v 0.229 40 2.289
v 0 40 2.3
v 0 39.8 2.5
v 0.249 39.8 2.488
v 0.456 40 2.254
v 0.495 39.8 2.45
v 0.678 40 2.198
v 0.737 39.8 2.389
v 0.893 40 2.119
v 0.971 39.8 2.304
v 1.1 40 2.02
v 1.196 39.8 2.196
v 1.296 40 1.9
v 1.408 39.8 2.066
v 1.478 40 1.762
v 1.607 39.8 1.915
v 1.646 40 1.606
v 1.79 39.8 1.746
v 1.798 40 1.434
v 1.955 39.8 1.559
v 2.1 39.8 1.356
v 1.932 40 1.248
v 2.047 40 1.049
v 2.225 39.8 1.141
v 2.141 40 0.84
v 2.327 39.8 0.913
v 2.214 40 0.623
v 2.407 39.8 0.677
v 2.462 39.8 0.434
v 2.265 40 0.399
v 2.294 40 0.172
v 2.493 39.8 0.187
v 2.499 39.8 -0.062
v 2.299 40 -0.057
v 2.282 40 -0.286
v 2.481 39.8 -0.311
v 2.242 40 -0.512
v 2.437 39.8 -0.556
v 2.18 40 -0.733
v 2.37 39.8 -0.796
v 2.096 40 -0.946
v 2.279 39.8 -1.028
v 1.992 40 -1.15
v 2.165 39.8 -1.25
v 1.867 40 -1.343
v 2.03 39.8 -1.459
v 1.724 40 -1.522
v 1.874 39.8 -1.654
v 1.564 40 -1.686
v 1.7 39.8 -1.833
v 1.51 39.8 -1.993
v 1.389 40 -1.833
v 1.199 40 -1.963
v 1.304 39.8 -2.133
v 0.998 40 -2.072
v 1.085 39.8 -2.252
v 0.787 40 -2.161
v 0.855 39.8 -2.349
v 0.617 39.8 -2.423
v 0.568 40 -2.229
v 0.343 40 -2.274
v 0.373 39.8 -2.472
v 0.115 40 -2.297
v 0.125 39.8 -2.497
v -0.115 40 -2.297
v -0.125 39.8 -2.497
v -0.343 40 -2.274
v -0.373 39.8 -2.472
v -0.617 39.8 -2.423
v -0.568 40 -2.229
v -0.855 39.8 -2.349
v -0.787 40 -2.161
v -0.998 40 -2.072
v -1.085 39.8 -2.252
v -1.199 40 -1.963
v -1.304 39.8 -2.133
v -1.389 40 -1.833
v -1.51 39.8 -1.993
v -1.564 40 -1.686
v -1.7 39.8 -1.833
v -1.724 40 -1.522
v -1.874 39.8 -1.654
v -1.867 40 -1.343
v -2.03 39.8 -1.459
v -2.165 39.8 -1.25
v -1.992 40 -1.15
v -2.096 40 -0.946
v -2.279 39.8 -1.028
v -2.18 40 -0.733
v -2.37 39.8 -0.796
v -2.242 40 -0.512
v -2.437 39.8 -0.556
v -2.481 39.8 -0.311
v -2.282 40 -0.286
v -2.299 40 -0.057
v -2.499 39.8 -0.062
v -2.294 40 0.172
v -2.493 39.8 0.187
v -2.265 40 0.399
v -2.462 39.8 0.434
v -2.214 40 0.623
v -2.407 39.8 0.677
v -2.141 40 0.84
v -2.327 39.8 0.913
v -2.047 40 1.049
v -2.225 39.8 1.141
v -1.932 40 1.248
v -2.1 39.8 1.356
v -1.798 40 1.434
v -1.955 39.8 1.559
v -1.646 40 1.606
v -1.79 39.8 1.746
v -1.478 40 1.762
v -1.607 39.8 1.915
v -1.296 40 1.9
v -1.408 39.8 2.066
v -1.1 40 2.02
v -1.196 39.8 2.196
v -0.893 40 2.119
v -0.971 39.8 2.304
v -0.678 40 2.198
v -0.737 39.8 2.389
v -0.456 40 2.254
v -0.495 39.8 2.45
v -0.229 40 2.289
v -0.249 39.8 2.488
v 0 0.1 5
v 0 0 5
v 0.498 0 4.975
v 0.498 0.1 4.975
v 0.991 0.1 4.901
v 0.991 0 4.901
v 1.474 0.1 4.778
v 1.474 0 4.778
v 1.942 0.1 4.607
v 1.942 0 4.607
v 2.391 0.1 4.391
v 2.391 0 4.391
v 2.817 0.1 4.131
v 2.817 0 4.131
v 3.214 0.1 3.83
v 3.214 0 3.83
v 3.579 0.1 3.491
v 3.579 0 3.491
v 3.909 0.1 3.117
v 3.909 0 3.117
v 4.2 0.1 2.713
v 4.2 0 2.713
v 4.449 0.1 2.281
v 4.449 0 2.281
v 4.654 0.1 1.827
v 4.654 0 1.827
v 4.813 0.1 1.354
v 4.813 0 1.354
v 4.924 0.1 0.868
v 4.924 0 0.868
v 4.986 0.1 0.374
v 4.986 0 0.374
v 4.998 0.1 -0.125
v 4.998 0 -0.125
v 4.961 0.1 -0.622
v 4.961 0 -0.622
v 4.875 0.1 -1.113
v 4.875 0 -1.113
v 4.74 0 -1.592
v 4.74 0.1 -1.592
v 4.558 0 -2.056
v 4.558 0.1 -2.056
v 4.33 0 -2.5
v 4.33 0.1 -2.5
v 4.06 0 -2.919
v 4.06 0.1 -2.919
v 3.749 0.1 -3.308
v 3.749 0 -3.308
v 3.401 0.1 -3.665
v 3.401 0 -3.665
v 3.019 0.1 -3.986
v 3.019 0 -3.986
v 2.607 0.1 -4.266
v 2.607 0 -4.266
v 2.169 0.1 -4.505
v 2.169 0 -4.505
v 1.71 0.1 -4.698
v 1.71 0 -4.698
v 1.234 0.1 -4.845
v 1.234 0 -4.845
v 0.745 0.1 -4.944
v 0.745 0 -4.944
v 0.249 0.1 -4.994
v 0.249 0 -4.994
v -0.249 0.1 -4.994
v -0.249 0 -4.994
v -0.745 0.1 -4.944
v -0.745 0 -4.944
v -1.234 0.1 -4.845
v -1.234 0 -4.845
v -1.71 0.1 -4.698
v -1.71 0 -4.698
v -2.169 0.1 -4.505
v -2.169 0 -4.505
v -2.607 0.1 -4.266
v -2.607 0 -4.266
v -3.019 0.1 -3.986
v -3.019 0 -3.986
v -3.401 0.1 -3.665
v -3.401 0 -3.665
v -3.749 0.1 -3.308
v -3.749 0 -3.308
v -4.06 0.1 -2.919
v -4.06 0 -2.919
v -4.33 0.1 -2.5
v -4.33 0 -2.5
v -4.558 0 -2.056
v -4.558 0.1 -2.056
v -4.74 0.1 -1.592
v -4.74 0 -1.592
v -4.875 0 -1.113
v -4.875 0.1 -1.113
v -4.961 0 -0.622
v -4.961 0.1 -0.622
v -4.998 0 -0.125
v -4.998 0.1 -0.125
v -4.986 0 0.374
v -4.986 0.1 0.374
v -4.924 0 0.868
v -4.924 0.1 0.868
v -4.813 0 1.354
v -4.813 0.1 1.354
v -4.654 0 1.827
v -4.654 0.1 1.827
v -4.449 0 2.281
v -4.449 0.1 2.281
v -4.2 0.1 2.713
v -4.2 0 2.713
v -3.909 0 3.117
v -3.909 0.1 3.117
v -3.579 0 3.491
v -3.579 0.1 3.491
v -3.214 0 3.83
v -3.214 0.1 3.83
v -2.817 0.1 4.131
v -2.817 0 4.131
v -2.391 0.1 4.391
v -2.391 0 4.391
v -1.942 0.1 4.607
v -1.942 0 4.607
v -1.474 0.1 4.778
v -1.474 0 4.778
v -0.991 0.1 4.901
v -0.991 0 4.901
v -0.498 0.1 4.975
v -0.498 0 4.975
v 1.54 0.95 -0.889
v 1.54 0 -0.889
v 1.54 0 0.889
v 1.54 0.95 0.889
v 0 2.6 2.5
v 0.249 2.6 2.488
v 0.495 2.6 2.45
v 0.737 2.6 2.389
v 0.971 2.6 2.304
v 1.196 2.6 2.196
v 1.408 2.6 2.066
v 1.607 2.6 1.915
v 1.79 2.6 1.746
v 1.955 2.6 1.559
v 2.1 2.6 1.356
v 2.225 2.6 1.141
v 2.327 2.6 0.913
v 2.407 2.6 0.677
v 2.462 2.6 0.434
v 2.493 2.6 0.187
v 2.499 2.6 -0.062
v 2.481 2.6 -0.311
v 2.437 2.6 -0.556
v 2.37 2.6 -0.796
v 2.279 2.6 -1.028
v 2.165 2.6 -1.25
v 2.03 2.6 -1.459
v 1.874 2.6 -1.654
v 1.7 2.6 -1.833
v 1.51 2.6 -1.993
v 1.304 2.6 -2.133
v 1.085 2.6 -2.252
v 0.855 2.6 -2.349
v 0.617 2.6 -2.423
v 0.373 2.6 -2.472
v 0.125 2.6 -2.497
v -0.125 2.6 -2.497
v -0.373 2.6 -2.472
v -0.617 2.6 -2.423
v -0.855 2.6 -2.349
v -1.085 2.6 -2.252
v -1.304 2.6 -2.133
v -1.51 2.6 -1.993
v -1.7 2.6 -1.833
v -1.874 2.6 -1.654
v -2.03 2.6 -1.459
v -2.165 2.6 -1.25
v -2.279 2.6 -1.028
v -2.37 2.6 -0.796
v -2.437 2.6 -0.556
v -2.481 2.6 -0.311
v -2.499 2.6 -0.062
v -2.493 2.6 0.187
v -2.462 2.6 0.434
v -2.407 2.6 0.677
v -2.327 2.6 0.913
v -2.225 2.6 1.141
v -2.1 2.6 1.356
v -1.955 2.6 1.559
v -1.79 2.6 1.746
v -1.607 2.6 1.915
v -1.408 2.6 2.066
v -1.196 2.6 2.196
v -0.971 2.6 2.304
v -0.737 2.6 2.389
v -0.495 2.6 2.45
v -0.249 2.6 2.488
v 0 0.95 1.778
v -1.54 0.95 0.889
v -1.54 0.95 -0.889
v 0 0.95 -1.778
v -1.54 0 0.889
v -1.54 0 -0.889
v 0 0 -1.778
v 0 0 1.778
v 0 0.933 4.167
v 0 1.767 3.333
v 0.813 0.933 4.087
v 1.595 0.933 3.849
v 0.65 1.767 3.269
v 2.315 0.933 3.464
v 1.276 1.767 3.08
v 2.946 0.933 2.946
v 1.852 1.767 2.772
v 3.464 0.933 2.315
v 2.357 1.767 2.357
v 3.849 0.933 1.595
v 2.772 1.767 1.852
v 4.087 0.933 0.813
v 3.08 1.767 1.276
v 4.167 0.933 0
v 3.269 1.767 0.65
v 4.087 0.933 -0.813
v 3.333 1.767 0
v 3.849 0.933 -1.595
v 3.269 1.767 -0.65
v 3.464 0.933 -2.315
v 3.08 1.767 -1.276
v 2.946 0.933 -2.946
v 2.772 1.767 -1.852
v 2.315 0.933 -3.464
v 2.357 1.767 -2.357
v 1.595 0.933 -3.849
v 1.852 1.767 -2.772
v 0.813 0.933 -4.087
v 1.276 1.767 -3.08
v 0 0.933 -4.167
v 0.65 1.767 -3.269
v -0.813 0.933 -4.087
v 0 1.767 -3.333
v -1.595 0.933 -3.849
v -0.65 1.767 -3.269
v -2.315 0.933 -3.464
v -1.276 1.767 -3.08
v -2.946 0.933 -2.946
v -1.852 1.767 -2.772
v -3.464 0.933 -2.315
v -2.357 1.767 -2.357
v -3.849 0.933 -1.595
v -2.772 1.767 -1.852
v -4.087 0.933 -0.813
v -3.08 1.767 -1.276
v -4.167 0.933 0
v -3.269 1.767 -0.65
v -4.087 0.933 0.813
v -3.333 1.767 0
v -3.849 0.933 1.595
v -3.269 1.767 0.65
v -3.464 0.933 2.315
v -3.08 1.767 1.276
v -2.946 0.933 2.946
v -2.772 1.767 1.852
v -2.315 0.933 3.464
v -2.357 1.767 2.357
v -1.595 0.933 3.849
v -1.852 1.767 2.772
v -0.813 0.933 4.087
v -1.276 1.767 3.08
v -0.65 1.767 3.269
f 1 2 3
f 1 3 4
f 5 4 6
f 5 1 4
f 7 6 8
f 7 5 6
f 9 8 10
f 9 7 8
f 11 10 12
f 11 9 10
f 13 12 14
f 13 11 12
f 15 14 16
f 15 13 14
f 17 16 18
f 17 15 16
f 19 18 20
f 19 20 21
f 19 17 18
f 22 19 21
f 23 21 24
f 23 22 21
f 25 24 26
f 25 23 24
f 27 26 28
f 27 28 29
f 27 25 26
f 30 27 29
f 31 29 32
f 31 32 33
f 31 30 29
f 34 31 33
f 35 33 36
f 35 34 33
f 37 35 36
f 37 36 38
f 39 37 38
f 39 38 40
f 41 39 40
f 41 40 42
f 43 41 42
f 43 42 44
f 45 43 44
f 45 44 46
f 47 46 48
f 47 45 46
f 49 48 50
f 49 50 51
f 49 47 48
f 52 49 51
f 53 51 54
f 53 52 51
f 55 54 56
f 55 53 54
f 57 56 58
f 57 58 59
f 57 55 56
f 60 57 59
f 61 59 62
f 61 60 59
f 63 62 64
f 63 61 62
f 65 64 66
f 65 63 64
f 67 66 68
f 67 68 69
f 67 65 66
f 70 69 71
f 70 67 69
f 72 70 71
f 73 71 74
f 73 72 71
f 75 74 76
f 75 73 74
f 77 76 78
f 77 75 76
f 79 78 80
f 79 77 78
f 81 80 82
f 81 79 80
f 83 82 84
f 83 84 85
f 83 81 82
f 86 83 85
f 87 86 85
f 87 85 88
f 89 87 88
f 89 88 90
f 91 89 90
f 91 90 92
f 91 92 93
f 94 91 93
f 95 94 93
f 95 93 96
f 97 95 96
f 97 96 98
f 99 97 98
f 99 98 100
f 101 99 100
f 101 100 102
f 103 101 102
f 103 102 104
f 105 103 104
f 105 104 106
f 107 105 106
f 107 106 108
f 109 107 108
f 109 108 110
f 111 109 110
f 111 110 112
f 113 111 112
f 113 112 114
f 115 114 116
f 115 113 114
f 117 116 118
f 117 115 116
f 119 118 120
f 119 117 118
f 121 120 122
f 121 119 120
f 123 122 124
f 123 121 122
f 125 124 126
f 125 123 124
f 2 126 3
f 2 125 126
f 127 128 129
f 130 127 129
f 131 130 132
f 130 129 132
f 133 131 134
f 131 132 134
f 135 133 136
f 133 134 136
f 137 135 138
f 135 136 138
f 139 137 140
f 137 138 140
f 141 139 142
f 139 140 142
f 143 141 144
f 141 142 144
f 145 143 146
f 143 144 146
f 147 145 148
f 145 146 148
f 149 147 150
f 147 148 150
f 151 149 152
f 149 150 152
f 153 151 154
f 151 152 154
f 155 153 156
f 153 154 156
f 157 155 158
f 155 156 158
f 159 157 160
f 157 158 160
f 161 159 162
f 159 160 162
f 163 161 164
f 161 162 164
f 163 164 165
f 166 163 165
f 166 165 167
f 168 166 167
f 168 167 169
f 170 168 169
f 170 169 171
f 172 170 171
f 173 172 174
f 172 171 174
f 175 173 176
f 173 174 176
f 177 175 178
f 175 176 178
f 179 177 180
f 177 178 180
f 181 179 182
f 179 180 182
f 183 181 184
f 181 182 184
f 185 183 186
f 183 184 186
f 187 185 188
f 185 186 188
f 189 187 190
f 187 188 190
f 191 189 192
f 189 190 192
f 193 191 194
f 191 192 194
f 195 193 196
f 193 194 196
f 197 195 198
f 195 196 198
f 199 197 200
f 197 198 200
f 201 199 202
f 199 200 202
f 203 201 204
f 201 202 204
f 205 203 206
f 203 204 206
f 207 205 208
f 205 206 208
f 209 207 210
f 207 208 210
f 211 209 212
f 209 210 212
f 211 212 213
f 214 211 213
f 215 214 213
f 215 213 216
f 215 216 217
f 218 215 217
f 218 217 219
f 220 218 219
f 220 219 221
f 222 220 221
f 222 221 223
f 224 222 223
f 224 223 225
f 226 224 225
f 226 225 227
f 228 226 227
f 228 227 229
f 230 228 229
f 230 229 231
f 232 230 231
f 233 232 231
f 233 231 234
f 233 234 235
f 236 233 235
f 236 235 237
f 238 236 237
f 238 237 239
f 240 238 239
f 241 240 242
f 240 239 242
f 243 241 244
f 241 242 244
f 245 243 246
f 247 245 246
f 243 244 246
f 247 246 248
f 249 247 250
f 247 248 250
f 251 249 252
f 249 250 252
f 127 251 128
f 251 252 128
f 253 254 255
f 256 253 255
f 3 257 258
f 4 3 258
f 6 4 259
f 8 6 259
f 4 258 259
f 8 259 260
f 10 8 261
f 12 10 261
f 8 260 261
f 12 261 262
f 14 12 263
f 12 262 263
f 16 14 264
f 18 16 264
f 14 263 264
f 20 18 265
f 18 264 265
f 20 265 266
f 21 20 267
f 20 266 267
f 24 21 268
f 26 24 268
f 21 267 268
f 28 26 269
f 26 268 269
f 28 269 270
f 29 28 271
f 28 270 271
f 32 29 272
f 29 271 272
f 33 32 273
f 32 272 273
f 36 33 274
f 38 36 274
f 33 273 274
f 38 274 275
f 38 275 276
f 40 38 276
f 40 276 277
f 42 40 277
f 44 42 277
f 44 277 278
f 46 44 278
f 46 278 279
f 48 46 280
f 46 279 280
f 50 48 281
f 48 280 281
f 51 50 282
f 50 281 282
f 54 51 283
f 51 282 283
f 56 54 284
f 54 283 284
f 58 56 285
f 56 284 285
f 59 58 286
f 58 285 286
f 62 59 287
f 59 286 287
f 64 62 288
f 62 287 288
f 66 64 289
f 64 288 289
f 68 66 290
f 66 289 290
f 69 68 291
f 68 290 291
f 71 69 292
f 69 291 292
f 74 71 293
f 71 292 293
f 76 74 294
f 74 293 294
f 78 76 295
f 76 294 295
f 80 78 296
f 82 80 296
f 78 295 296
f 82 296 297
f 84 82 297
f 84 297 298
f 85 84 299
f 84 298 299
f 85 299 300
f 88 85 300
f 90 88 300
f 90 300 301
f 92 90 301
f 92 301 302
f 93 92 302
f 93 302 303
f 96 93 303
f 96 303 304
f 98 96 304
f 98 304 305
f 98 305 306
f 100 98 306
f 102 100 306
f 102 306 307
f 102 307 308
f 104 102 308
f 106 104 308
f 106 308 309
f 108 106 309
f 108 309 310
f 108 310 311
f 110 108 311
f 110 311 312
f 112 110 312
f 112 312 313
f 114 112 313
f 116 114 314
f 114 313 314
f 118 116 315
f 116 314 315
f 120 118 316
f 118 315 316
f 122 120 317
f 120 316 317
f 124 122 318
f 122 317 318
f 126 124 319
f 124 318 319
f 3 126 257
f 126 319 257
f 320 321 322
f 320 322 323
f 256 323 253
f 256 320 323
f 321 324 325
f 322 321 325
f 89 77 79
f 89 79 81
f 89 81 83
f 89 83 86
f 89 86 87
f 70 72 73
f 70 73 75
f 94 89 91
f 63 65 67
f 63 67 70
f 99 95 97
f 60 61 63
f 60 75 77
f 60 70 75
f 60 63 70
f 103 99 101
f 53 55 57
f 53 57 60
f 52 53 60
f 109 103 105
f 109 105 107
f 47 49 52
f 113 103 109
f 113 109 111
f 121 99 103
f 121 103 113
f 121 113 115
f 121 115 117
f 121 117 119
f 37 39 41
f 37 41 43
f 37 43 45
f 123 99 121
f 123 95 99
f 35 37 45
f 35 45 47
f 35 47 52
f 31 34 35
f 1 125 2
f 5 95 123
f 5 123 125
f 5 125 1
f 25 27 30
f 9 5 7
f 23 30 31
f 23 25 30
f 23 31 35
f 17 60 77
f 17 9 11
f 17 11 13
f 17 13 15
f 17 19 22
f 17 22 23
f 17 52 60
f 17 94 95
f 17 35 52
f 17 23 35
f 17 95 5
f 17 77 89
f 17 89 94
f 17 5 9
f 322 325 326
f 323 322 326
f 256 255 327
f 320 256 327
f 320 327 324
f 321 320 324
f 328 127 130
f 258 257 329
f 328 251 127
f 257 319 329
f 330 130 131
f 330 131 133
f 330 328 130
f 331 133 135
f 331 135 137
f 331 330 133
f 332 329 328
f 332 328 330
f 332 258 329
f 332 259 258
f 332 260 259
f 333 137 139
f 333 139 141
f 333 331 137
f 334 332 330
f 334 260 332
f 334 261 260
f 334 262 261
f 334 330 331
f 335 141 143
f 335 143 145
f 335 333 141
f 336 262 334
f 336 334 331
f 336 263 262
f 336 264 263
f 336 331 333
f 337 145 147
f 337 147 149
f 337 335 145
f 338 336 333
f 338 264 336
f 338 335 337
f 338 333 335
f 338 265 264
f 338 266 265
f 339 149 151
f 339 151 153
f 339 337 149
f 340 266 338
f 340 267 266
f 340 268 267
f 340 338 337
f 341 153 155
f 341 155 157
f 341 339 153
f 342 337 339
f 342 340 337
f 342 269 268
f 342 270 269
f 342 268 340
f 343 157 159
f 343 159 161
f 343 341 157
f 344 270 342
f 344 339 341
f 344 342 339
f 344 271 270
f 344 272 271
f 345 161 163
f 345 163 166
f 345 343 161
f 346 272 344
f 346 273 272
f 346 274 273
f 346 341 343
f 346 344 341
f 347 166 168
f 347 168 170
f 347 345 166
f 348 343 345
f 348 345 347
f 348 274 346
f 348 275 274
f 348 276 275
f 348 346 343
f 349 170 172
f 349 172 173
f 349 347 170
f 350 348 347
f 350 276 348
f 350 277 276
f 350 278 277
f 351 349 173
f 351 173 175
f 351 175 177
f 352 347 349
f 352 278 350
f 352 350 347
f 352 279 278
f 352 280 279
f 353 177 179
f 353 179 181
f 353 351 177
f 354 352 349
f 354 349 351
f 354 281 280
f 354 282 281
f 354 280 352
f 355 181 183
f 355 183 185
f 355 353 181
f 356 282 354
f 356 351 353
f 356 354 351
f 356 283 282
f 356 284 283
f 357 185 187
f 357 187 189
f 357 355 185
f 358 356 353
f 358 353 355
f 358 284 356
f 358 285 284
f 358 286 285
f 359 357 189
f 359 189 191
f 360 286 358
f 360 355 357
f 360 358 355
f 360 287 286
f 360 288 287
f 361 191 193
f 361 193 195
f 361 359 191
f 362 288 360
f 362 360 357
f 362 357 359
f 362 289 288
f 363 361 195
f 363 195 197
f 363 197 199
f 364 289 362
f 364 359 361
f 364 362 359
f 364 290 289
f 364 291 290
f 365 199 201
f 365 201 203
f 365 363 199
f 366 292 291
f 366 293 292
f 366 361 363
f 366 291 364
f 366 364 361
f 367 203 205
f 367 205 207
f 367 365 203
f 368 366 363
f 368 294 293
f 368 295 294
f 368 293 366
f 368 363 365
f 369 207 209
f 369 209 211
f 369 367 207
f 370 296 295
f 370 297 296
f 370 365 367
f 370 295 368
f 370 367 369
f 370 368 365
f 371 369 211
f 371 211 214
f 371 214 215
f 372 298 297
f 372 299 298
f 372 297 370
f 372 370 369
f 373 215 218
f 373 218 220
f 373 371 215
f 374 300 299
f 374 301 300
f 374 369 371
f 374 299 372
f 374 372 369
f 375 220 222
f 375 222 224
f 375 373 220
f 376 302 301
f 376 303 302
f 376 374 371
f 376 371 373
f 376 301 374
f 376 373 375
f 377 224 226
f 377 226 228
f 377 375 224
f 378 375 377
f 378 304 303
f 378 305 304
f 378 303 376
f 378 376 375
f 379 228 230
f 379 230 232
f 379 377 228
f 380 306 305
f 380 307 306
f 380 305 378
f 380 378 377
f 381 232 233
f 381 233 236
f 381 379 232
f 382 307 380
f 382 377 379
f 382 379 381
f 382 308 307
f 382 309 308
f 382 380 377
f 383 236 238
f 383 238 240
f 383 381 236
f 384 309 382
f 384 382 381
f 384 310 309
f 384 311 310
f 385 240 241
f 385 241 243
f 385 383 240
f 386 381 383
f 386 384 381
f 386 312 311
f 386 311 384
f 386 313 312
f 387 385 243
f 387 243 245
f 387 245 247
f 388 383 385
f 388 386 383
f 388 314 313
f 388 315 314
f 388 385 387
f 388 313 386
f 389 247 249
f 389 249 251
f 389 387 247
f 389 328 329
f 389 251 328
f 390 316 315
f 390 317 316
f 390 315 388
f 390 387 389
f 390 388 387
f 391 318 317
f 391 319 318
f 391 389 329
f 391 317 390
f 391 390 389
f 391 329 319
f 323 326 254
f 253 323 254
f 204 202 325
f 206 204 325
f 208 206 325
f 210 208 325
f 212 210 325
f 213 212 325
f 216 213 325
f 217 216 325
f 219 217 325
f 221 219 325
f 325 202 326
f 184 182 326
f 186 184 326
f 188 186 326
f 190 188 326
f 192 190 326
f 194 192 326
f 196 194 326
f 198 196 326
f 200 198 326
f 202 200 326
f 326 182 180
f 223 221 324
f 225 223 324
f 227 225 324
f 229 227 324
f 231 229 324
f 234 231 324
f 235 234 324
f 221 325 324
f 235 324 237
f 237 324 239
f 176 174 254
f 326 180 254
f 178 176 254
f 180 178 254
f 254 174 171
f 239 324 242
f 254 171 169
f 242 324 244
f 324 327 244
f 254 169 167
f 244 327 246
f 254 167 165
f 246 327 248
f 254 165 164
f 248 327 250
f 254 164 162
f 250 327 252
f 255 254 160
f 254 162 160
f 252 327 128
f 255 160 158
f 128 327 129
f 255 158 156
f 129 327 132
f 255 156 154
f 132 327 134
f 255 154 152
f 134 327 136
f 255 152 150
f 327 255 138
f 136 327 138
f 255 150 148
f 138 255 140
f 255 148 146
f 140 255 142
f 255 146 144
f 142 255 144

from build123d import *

# Parameters (mm, degrees)
SKETCH_1_R          = 5
EXTRUDE_1_DEPTH     = 2.6
CHAMFER_1_SIZE      = 2.5
CUT_EXTRUDE_1_DEPTH = 0.95
SKETCH_3_R          = 2.5
EXTRUDE_2_DEPTH     = 37.4
CHAMFER_2_SIZE      = 0.2


with BuildPart() as part:
    # 草图1 → 凸台-拉伸1 (new body)
    with BuildSketch(Plane(origin=(0, 0, 0), x_dir=(1, 0, 0), z_dir=(0, 1, 0))):
        with Locations(Location((0, 0, 0), (0, 0, 270))):
            Circle(SKETCH_1_R)
    extrude(amount=EXTRUDE_1_DEPTH)

    # 倒角1
    chamfer_1_edges = [part.edges().sort_by_distance(p)[0] for p in [
        (0, 2.6, -5),
    ]]
    chamfer(chamfer_1_edges, length=CHAMFER_1_SIZE)

    # 草图2 → 切除-拉伸1 (cut)
    with BuildSketch(Plane.XZ):
        Polygon((1.54, -0.889119415), (1.54, 0.889119415), (0, 1.778238829), (-1.54, 0.889119415), (-1.54, -0.889119415), (0, -1.778238829), align=None)
    extrude(amount=-CUT_EXTRUDE_1_DEPTH, mode=Mode.SUBTRACT)

    # 草图3 → 凸台-拉伸2 (add)
    with BuildSketch(Plane(origin=(0, 2.6, 0), x_dir=(1, 0, 0), z_dir=(0, 1, 0))):
        with Locations(Location((0, 0, 0), (0, 0, 270))):
            Circle(SKETCH_3_R)
    extrude(amount=EXTRUDE_2_DEPTH)

    # 倒角2
    chamfer_2_edges = [part.edges().sort_by_distance(p)[0] for p in [
        (0, 40, -2.5),
    ]]
    chamfer(chamfer_2_edges, length=CHAMFER_2_SIZE)


solid = part.part
